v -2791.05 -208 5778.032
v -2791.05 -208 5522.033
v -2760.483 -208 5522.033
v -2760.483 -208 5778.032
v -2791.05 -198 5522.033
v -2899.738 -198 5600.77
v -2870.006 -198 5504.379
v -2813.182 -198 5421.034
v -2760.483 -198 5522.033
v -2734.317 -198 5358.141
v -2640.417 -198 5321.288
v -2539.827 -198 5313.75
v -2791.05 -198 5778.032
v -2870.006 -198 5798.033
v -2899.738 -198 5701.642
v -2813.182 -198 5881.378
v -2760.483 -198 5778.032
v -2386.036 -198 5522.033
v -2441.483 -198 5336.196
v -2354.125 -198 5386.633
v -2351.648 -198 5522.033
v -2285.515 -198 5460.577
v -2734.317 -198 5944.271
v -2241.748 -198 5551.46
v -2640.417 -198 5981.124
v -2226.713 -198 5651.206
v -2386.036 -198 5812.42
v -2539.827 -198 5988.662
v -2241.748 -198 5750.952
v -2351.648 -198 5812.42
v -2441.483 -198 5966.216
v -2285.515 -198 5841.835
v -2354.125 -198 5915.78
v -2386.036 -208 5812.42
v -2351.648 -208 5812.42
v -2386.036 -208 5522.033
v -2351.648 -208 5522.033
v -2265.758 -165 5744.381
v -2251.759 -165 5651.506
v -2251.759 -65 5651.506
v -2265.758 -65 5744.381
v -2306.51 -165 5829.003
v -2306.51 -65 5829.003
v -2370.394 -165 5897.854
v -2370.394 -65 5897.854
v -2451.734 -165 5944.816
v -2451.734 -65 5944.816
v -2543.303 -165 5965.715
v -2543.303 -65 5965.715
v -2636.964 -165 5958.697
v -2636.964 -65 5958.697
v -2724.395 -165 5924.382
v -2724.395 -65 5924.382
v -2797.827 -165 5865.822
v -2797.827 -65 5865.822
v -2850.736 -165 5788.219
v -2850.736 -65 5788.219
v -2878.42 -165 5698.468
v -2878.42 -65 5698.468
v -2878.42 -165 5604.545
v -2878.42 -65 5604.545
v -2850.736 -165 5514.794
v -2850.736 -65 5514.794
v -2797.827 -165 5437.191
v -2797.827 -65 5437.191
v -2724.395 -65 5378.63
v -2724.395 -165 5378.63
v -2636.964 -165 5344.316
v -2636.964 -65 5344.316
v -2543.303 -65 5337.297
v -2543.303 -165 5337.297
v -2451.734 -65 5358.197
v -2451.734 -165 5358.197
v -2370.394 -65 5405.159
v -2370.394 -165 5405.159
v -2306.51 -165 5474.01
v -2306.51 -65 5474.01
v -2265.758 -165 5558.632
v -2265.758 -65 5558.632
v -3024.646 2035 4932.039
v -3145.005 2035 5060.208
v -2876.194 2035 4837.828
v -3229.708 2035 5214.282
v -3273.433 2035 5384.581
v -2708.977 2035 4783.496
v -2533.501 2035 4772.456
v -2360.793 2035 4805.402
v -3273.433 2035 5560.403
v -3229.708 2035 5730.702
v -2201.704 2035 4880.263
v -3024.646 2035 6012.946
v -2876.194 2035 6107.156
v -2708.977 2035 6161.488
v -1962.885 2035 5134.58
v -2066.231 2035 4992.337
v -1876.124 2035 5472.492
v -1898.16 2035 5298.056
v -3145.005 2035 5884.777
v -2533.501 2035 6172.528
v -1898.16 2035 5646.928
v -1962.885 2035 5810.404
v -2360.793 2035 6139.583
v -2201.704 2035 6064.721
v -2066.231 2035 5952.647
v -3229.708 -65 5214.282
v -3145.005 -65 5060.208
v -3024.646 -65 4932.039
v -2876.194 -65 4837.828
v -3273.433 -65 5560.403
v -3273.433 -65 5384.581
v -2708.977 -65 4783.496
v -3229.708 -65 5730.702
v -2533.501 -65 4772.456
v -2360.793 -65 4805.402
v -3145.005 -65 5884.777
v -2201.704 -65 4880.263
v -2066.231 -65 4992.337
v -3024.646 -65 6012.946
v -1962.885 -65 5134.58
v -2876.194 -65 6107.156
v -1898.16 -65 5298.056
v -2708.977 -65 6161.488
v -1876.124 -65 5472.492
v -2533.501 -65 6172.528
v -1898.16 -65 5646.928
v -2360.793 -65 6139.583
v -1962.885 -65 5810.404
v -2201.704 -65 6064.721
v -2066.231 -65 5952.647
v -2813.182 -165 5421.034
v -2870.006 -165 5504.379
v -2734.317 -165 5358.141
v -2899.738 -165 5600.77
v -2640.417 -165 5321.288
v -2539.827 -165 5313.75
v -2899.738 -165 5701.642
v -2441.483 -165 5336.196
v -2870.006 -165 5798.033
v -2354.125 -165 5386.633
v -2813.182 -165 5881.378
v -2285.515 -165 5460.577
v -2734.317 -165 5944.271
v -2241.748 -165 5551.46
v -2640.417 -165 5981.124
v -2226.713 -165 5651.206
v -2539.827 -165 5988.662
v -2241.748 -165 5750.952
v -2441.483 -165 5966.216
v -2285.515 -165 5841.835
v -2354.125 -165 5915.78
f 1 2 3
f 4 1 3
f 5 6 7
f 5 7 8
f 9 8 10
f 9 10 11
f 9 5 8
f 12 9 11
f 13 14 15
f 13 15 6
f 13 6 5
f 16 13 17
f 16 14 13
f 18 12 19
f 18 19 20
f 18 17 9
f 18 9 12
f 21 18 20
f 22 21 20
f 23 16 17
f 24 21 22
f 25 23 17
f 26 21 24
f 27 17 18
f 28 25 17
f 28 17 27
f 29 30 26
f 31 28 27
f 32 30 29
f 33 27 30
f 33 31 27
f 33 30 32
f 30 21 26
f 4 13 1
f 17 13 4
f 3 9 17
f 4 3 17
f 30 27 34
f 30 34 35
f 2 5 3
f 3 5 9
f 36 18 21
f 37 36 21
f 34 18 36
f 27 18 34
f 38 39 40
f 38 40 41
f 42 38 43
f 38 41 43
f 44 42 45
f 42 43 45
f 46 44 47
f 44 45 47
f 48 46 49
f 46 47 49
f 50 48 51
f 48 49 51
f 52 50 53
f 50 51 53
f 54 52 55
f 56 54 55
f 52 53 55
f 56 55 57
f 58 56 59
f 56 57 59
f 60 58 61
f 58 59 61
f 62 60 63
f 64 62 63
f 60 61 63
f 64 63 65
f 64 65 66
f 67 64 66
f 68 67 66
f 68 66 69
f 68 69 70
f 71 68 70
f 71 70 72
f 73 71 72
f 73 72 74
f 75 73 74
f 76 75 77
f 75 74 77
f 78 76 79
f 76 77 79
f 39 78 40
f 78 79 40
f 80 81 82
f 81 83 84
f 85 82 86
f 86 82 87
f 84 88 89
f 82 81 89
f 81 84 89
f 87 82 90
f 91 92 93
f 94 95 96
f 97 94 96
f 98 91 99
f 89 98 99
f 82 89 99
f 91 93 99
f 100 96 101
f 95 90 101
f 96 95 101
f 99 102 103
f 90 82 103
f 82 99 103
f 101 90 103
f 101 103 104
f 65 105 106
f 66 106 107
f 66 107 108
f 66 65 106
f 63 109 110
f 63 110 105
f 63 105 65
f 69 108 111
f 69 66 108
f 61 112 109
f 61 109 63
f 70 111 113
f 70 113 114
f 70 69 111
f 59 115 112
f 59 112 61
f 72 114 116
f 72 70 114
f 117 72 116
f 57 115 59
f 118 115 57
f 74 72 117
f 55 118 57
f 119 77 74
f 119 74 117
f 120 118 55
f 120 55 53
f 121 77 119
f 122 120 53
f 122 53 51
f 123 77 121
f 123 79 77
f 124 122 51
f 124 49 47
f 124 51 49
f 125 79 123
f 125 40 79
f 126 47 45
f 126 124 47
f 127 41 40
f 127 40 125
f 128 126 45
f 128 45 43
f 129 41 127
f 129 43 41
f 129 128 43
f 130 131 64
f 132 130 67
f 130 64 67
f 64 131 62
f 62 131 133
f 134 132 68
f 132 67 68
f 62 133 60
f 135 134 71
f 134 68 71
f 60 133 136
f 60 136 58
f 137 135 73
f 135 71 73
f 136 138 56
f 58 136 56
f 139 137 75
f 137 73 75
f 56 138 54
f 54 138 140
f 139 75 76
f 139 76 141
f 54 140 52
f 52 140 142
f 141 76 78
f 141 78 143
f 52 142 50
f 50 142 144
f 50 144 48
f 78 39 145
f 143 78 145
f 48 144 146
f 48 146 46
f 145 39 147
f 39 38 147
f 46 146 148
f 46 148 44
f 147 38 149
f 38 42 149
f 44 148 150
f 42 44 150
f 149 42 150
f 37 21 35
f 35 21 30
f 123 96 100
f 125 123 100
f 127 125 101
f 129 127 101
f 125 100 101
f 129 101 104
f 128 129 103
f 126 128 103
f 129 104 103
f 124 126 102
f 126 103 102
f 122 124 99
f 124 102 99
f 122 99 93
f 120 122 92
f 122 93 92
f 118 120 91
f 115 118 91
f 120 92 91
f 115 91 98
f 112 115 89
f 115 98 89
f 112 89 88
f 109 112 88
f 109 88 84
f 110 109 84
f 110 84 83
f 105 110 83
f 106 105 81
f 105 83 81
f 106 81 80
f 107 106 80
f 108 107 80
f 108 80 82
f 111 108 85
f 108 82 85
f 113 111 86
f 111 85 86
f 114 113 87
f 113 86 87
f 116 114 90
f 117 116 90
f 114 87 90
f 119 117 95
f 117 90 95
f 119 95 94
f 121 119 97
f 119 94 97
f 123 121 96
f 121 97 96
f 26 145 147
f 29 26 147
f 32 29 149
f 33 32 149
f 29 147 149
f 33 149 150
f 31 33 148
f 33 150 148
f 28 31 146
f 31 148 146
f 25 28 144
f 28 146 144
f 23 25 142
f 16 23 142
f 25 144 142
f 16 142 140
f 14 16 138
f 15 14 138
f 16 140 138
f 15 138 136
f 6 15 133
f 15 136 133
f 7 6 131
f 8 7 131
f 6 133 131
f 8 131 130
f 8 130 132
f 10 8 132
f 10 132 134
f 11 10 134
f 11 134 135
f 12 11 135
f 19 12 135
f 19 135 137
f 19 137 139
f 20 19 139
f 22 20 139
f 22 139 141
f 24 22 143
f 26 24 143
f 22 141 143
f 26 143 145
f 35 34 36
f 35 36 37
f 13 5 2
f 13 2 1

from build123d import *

# Parameters (mm, degrees)
SKETCH013_R   = 701.420325
PAD013_DEPTH  = 2100
SKETCH014_R   = 315.090162
PAD014_DEPTH  = 100
SKETCH016_R   = 338.402277
PAD016_DEPTH  = 33
SKETCH027_W   = 30.567139
SKETCH027_H   = 255.999512
SKETCH027_W_2 = 34.387939
SKETCH027_H_2 = 290.387695
PAD021_DEPTH  = 10


with BuildPart() as part:
    # Sketch013 → Pad013 (new body)
    with BuildSketch(Plane.XZ):
        with Locations((-2577.543945, 5472.492188)):
            Circle(SKETCH013_R)
    extrude(amount=PAD013_DEPTH)

    # Sketch014 (on Face3 of Pad013) → Pad014 (join)
    with BuildSketch(Plane.XZ.offset(2100)):
        with Locations((-2566.849609, 5651.506348)):
            Circle(SKETCH014_R)
    extrude(amount=PAD014_DEPTH)

    # Sketch016 (on Face5 of Pad014) → Pad016 (join)
    with BuildSketch(Plane.XZ.offset(2200)):
        with Locations((-2565.115723, 5651.206055)):
            Circle(SKETCH016_R)
    extrude(amount=PAD016_DEPTH)

    # Sketch027 (on Face3 of Pad016) → Pad021 (join)
    with BuildSketch(Plane.XZ.offset(2233)):
        with Locations((-2775.766723, 5650.032471)):
            Rectangle(SKETCH027_W, SKETCH027_H)
        with Locations((-2368.842407, 5667.226562)):
            Rectangle(SKETCH027_W_2, SKETCH027_H_2)
    extrude(amount=PAD021_DEPTH)


with BuildPart() as part_1:
    # Body013 placement: moved
    add(part.part.moved(Location((0, 2035, 0))))


solid = part_1.part
